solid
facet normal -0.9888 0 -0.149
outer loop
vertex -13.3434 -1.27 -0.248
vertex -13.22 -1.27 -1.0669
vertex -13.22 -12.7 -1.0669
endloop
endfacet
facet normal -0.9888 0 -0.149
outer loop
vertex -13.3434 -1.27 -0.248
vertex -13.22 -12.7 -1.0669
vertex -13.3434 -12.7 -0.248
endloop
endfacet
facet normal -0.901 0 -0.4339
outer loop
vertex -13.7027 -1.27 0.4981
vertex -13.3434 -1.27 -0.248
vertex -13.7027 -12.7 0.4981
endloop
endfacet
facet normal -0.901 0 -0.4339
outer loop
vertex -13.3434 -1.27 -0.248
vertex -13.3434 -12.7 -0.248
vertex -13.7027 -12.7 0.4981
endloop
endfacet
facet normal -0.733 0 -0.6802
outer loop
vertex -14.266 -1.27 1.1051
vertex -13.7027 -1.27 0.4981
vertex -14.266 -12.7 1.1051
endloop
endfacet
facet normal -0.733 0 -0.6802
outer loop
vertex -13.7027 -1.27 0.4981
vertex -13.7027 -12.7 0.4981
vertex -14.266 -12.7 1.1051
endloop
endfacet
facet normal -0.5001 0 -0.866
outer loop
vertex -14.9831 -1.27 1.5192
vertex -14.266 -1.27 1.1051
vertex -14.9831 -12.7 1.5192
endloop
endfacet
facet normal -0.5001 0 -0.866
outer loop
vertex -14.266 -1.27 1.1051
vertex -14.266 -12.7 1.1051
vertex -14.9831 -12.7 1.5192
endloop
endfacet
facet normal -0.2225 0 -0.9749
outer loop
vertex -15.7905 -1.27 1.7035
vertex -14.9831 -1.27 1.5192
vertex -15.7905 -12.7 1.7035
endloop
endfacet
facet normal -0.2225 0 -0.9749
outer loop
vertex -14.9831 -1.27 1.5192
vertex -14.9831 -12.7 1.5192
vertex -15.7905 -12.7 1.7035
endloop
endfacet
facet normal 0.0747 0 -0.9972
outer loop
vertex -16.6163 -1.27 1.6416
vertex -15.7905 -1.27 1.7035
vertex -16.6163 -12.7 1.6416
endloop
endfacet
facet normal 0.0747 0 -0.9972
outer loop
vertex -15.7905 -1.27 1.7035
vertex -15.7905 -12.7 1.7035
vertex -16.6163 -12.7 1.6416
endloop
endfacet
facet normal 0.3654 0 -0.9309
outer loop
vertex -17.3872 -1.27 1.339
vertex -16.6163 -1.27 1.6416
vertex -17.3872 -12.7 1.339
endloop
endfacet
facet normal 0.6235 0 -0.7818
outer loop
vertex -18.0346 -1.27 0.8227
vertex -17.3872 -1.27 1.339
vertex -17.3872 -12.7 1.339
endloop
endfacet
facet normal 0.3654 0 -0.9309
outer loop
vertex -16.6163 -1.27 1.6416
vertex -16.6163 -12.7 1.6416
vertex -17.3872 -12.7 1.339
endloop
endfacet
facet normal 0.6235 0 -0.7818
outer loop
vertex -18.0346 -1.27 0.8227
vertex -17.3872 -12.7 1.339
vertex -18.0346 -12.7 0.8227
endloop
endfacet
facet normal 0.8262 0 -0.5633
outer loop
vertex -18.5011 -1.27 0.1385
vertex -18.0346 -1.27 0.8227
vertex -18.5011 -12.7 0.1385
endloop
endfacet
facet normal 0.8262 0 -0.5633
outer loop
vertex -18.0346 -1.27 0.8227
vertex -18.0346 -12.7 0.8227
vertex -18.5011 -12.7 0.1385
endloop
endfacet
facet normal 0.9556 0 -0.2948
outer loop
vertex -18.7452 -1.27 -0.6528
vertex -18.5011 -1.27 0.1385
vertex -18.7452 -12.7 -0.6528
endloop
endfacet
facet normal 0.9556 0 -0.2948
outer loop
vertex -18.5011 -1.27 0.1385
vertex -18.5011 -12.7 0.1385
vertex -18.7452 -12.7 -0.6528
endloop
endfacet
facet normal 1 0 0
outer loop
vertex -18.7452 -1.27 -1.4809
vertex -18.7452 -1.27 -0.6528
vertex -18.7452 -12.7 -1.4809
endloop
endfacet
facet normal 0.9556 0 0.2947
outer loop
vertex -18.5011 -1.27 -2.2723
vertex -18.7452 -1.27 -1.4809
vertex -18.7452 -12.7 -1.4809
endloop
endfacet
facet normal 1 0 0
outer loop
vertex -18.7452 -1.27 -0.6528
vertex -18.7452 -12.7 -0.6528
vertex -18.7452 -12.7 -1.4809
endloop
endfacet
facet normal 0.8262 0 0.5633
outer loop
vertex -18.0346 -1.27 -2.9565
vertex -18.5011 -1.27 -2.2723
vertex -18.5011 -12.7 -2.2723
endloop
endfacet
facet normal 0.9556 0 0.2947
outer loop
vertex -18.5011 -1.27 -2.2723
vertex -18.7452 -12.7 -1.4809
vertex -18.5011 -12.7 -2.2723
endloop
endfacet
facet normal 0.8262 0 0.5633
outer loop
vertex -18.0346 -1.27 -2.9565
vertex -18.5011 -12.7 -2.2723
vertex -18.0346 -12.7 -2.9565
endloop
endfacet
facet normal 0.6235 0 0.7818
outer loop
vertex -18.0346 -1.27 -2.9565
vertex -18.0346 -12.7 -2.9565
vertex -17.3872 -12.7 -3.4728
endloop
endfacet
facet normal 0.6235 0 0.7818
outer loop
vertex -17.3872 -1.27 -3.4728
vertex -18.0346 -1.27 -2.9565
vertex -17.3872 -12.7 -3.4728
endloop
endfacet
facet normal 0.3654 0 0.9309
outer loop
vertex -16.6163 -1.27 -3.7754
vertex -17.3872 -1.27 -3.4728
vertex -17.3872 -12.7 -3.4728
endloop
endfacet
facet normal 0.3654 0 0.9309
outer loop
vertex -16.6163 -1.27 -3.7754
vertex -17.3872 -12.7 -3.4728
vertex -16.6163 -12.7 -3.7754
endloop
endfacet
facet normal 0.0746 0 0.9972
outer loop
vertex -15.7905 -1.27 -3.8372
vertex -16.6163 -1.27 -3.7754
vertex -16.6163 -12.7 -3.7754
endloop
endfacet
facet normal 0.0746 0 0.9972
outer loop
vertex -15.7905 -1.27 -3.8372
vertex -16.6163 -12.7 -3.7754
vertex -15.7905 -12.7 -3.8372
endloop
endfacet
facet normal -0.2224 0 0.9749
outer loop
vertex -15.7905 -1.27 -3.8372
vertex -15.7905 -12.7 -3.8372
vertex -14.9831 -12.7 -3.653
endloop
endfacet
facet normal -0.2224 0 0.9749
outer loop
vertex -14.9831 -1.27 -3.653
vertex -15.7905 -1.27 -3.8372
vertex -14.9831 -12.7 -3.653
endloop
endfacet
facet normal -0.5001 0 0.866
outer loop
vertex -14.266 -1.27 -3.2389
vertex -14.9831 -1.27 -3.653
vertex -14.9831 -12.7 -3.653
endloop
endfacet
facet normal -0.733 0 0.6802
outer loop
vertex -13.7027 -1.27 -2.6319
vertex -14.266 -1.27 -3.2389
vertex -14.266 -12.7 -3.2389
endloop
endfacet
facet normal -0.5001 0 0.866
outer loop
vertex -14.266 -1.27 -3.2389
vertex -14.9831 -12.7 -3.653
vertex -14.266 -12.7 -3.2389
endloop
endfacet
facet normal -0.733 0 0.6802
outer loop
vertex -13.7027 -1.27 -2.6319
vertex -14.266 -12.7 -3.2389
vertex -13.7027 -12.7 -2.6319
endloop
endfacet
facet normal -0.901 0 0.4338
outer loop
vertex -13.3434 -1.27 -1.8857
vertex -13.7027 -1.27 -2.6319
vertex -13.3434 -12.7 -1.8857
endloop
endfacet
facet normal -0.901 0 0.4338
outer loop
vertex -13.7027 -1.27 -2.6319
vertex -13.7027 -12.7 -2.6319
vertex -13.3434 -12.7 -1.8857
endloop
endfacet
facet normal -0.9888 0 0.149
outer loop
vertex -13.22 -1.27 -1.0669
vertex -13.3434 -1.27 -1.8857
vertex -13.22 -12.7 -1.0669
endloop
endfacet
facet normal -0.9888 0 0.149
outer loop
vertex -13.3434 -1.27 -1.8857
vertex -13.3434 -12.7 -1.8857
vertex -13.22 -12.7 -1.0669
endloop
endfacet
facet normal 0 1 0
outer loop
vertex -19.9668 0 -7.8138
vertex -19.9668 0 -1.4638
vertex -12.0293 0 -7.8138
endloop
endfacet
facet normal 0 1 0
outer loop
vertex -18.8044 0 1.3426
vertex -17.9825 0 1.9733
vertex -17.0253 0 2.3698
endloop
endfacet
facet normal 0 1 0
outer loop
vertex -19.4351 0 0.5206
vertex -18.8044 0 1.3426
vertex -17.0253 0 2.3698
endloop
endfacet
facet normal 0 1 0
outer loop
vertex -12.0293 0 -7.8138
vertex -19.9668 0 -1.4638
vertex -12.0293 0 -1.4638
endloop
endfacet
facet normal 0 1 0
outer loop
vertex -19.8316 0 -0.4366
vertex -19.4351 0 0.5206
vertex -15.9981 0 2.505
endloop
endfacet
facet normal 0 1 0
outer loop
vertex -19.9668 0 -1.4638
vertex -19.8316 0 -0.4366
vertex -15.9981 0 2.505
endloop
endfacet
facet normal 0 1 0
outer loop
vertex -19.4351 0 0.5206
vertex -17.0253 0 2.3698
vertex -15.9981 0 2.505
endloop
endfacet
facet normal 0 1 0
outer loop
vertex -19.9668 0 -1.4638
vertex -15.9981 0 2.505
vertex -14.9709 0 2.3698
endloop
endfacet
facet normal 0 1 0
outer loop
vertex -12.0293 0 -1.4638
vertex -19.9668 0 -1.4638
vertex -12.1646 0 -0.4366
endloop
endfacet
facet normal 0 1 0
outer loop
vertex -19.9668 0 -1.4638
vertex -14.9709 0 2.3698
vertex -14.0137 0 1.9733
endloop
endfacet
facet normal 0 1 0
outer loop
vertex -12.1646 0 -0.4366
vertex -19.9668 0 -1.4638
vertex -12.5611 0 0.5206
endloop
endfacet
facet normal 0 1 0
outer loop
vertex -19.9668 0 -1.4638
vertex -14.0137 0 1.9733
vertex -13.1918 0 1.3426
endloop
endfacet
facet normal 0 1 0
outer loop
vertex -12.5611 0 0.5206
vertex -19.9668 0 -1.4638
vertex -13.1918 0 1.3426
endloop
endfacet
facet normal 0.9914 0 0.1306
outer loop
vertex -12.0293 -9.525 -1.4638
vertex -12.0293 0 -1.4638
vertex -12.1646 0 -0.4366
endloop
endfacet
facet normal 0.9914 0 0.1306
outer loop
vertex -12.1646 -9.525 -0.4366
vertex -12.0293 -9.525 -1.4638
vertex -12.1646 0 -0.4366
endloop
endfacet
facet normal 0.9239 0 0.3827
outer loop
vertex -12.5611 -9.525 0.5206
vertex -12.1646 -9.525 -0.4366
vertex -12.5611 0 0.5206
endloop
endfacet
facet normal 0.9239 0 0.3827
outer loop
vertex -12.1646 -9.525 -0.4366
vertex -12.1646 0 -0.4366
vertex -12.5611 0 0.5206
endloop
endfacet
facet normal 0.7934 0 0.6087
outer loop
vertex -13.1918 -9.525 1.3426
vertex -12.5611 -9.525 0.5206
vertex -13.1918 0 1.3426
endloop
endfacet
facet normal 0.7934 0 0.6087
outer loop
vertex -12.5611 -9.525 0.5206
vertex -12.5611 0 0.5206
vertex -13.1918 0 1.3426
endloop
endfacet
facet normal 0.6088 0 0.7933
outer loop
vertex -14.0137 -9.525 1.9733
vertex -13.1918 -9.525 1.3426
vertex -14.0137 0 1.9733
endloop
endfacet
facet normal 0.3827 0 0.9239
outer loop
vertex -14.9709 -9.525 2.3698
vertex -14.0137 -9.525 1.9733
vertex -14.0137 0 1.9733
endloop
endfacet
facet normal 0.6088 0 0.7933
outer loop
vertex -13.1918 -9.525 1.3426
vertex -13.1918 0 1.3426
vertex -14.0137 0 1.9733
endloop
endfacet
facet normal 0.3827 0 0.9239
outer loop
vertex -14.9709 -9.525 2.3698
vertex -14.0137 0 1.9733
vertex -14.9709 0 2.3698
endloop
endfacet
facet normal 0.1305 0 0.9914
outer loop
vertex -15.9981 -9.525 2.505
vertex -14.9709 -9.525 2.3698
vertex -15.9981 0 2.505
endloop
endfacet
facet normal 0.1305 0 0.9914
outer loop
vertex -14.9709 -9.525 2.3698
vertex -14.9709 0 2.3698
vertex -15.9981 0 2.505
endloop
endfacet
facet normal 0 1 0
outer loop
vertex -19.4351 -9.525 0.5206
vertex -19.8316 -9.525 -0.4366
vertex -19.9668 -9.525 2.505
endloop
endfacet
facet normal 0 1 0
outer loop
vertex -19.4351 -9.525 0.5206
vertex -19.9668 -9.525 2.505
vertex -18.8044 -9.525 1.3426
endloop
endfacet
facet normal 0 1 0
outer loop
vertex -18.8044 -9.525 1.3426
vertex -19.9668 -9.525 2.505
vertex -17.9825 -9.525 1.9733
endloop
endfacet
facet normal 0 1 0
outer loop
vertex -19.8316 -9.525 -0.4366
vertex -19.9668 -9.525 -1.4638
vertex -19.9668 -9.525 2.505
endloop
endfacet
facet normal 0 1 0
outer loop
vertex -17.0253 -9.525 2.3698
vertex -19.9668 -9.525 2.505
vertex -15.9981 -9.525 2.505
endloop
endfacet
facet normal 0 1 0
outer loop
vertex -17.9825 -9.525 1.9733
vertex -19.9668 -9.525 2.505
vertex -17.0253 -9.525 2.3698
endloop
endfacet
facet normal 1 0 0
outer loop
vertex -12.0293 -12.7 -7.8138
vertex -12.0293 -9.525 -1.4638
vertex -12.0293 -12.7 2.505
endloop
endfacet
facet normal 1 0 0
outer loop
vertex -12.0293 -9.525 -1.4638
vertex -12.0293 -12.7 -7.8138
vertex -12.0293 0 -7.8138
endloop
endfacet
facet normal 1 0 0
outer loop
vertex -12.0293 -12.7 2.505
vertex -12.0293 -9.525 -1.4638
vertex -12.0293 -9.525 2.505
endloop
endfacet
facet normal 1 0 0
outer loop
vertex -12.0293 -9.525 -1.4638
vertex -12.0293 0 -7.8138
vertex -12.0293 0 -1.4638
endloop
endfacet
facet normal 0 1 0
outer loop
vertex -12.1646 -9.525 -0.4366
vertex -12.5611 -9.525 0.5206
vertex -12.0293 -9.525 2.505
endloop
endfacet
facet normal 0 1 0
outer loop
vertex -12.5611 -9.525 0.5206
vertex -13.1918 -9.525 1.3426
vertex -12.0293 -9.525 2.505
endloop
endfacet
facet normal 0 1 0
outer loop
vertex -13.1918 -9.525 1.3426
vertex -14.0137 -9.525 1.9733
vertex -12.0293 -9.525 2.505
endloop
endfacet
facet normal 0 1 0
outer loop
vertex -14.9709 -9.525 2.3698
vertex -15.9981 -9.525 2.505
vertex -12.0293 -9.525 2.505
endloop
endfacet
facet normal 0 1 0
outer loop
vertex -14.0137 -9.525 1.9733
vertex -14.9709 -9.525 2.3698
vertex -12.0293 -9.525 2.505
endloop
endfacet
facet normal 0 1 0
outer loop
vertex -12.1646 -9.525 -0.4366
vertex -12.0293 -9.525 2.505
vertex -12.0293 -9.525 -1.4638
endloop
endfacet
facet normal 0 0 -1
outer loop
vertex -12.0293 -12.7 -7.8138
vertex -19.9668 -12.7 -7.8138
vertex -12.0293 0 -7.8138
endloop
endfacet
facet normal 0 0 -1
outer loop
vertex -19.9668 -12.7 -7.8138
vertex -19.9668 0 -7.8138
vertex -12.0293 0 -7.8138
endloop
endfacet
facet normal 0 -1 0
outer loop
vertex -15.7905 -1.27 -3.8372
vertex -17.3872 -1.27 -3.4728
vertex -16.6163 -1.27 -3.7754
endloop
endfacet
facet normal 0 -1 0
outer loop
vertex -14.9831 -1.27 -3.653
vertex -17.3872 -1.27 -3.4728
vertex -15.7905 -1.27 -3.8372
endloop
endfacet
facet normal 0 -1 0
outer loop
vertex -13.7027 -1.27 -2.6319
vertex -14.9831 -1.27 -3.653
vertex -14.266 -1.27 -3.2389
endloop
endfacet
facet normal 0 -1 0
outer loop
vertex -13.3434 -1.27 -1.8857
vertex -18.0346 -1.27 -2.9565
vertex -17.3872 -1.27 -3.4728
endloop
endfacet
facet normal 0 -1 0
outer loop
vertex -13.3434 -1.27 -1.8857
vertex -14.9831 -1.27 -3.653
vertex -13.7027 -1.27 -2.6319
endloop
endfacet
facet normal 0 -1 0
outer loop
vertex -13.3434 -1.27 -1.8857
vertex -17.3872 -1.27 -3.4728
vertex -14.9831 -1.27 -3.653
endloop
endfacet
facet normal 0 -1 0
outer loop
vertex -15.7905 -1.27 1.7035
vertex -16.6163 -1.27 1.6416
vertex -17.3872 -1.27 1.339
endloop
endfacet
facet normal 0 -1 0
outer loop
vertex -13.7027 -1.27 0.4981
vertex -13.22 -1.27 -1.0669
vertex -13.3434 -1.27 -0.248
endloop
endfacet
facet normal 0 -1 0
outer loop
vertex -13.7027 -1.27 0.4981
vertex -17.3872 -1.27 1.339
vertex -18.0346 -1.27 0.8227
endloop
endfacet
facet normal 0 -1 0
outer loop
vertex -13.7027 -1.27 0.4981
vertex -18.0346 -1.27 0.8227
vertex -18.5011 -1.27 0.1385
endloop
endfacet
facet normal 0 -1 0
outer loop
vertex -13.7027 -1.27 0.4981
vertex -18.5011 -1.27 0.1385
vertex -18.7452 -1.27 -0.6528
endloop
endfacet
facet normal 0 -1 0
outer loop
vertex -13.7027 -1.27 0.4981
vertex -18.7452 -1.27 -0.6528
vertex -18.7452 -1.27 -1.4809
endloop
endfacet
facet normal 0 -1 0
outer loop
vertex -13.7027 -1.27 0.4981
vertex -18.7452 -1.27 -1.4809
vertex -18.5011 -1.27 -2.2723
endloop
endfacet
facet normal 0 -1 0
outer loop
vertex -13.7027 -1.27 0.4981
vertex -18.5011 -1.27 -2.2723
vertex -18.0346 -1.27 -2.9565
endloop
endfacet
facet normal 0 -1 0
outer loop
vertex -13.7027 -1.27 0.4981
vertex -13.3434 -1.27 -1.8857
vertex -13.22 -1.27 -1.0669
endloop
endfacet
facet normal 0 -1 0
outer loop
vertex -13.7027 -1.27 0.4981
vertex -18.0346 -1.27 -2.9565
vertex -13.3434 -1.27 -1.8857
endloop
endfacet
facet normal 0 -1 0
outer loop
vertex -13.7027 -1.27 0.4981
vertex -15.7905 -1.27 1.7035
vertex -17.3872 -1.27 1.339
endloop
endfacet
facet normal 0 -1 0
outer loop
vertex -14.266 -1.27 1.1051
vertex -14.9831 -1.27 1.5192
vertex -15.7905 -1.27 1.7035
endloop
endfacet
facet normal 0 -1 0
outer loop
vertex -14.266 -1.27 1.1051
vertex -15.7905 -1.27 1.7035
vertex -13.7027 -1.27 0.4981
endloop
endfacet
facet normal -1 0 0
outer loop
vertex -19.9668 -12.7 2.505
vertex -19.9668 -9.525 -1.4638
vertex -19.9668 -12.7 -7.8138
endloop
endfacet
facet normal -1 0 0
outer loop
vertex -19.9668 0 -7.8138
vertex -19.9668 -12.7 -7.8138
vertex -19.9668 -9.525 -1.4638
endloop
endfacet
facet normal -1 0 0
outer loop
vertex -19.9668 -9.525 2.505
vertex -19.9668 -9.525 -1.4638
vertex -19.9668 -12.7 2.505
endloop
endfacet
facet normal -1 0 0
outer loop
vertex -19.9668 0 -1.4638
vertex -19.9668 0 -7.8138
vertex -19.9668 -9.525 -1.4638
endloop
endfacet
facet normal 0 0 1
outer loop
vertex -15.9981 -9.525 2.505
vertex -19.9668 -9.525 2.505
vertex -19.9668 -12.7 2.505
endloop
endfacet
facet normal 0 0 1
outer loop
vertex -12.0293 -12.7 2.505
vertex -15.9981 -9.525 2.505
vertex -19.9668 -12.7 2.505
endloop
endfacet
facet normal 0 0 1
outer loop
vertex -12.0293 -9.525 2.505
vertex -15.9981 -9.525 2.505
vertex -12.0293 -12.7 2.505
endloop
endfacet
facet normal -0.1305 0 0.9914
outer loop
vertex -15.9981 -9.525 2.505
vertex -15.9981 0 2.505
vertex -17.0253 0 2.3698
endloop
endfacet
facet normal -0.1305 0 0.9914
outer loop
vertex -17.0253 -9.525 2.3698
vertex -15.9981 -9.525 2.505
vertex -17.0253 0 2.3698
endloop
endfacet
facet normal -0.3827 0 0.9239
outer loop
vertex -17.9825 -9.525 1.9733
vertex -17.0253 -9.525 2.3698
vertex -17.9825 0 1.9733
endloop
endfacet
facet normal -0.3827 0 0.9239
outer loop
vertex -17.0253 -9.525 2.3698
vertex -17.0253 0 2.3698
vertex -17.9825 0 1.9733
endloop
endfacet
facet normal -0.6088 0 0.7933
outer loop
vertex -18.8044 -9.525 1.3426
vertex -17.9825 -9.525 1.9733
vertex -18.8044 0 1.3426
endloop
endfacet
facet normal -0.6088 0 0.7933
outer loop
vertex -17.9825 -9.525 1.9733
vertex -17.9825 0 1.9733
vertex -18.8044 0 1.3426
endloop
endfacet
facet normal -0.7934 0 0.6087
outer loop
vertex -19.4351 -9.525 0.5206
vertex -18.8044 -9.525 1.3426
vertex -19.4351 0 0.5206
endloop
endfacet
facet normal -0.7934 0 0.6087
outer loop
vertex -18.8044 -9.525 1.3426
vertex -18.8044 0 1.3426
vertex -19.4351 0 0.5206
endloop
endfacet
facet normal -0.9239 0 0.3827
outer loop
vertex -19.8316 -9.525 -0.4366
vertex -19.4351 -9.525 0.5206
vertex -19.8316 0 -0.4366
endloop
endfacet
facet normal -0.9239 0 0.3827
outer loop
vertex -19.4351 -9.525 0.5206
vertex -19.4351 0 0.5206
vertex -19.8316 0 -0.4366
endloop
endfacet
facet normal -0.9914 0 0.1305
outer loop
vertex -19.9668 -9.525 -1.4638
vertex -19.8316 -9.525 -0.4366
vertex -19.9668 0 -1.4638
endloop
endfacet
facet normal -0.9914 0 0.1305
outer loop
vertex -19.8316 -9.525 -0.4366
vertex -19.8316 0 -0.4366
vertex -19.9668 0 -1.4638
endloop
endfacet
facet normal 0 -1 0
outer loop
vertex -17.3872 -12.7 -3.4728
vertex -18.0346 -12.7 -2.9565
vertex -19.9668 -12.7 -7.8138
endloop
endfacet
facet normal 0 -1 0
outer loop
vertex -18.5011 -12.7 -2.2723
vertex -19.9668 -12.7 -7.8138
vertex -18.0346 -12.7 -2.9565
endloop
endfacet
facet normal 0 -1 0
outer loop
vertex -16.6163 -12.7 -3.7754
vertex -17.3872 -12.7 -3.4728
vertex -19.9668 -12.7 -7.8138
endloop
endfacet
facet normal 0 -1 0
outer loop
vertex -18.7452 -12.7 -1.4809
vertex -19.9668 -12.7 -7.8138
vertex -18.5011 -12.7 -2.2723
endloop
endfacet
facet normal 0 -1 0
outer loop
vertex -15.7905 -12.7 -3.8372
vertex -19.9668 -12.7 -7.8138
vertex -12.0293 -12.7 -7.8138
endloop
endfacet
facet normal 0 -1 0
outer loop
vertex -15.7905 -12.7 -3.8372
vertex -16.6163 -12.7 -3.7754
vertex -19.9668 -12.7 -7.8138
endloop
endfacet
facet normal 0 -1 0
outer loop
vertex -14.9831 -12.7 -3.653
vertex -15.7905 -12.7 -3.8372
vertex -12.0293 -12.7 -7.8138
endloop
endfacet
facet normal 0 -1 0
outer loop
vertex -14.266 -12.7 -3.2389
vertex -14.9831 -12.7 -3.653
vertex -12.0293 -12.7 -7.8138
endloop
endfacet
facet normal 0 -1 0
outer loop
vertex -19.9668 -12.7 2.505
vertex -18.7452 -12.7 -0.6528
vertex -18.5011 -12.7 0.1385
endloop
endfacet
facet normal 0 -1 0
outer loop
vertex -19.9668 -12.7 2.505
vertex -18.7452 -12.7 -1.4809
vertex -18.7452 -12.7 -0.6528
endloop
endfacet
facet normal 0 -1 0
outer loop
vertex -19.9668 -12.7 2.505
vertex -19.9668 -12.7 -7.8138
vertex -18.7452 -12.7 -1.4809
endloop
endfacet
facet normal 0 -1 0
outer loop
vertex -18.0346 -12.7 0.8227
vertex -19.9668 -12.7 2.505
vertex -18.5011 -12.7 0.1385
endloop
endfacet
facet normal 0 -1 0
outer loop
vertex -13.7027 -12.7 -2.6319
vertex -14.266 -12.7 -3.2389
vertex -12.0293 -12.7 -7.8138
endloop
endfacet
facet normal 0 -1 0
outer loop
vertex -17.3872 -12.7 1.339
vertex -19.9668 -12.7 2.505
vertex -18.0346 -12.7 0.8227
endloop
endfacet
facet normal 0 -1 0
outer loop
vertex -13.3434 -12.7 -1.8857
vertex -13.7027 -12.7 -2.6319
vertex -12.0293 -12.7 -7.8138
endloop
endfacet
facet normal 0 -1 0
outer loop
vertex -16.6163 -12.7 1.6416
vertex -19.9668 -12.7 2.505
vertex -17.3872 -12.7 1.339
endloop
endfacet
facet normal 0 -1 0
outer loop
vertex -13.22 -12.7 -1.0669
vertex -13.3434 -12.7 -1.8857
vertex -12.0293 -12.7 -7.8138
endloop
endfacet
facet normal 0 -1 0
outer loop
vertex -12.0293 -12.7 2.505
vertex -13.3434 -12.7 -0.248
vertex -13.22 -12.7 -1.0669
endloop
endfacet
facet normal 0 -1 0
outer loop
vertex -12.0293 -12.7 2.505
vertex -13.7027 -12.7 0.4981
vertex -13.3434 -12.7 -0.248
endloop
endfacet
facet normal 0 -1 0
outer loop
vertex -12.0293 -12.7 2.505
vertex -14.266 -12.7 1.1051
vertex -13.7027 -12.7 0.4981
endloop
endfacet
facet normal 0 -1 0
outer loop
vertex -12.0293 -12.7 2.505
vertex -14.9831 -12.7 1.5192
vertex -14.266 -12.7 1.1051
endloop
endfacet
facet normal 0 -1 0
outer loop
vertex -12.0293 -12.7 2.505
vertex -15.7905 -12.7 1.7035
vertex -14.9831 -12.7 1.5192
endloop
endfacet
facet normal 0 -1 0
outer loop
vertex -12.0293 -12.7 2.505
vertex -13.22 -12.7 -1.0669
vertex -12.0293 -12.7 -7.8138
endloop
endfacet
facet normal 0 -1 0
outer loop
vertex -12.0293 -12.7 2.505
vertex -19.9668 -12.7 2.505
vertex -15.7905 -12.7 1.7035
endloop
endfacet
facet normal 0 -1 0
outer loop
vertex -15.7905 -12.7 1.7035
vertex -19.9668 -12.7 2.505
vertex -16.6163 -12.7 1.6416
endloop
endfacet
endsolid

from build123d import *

# Parameters (mm, degrees)
F0_W     = 7.9375
F0_H     = 6.35
F1_DEPTH = 9.525
F3_W     = 7.9375
F3_H     = 10.31875
F4_DEPTH = 3.175
F5_R     = 2.778125
F6_DEPTH = 11.43


with BuildPart() as f1:
    # F0 (on Front) → F1 (new body)
    with BuildSketch(Plane.XZ):
        with Locations((-15.998094, -4.638754)):
            Rectangle(F0_W, F0_H)
        with BuildLine():
            ThreePointArc((-15.998094, 2.504996), (-18.804425, 1.342576), (-19.966844, -1.463754))
            Line((-19.966844, -1.463754), (-12.029344, -1.463754))
            ThreePointArc((-12.029344, -1.463754), (-13.191764, 1.342576), (-15.998094, 2.504996))
        make_face()
    extrude(amount=F1_DEPTH)

    # F3 (on face) → F4 (join)
    with BuildSketch(Plane.XZ.offset(9.525)):
        with Locations((-15.998094, -2.654379)):
            Rectangle(F3_W, F3_H)
    extrude(amount=F4_DEPTH)

    # F5 (on face) → F6 (cut)
    with BuildSketch(Plane.XZ.offset(12.7)):
        with Locations((-15.998094, -1.066879)):
            Circle(F5_R)
    extrude(amount=-F6_DEPTH, mode=Mode.SUBTRACT)


solid = f1.part
